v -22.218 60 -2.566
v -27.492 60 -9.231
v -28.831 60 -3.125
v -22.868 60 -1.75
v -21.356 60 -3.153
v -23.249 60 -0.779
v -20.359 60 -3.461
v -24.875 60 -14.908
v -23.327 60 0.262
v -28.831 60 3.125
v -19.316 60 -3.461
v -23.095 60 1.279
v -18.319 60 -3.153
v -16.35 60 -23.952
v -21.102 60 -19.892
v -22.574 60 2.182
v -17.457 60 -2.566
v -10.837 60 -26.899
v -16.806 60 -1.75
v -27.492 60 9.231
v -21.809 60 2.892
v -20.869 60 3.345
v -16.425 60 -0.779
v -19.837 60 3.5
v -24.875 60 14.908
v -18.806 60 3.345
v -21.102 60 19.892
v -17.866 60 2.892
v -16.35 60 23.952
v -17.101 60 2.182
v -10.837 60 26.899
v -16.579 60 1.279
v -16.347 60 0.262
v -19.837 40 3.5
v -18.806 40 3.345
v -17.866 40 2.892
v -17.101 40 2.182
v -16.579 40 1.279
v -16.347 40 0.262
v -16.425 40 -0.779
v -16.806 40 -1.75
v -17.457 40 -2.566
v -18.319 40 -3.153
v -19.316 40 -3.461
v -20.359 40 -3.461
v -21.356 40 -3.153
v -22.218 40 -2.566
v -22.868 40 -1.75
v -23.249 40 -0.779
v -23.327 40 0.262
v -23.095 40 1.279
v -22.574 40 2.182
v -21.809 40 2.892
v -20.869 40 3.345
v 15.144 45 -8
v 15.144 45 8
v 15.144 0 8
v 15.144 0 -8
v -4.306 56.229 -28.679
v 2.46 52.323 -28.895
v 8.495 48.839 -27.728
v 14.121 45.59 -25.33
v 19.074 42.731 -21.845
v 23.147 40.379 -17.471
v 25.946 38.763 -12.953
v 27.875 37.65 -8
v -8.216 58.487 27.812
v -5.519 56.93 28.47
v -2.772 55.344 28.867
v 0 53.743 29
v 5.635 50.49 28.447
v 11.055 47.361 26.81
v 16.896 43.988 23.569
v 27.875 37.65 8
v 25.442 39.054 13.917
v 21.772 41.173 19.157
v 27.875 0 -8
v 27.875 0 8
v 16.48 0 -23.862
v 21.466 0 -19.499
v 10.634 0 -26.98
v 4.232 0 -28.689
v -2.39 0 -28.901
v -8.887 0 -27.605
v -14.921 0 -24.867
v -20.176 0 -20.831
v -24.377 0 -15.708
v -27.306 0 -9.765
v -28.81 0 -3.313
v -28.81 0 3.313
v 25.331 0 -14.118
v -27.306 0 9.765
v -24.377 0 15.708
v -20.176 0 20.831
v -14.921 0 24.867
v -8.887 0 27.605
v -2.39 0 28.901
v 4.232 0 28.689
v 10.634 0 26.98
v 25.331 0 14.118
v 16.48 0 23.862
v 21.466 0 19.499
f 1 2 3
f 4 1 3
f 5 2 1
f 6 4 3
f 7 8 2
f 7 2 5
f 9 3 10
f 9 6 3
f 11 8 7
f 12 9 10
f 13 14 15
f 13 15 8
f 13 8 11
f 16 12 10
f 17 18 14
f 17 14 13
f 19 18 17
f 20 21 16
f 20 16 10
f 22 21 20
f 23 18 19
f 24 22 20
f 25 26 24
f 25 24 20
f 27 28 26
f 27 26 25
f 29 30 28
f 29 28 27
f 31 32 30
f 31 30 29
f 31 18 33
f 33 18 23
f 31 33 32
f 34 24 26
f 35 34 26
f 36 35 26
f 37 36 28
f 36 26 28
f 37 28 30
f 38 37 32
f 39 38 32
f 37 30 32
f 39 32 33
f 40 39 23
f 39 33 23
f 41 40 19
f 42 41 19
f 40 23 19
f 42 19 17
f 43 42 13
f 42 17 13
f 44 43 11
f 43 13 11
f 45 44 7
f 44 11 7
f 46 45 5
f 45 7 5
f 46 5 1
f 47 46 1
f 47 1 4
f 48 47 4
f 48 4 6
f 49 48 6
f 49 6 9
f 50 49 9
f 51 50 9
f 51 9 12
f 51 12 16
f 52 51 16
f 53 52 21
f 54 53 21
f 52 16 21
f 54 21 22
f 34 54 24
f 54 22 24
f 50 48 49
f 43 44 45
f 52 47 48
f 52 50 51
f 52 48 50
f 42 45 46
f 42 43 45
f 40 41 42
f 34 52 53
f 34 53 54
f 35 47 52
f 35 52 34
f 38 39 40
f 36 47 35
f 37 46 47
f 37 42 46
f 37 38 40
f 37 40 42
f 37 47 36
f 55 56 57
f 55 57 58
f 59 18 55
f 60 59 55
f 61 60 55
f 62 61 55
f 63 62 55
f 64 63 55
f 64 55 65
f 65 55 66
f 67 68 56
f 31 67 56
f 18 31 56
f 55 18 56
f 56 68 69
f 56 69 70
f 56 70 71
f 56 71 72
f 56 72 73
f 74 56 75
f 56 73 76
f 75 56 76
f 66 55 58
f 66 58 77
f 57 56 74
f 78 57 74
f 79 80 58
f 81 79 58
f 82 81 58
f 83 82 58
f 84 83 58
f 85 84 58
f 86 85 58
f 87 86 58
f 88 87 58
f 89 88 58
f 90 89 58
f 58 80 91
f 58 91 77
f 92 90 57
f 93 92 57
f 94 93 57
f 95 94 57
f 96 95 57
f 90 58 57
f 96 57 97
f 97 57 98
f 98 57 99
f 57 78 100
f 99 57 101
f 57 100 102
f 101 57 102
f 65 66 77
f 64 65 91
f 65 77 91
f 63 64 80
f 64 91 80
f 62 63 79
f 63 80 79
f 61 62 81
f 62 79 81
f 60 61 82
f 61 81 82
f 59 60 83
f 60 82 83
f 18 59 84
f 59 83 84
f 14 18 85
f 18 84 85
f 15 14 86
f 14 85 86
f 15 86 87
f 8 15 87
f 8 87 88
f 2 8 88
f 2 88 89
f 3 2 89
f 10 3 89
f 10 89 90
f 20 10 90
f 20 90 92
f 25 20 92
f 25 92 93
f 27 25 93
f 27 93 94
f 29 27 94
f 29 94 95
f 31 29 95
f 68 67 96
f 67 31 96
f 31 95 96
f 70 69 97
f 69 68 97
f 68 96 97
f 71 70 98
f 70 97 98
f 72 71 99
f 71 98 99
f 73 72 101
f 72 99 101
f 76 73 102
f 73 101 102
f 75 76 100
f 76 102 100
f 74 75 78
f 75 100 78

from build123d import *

# Parameters (mm, degrees)
SKETCH3_R           = 29
BOSS_EXTRUDE1_DEPTH = 60
CUT_EXTRUDE1_DEPTH  = 30
SKETCH8_R           = 3.5
CUT_EXTRUDE2_DEPTH  = 20
SKETCH15_W          = 16
SKETCH15_H          = 16
CUT_EXTRUDE4_DEPTH  = 61


with BuildPart() as part:
    # Sketch3 → Boss-Extrude1 (new body)
    with BuildSketch(Plane(origin=(0, 0, 0), x_dir=(1, 0, 0), z_dir=(0, 1, 0))):
        with Locations(Location((0, 0, 0), (0, 0, 270))):
            Circle(SKETCH3_R)
    extrude(amount=BOSS_EXTRUDE1_DEPTH)

    # Sketch6 → Cut-Extrude1 (cut, symmetric)
    with BuildSketch(Plane.XY):
        Polygon((-10.837168574, 60), (29, 37), (29, 60), align=None)
    extrude(amount=CUT_EXTRUDE1_DEPTH, both=True, mode=Mode.SUBTRACT)

    # Sketch8 → Cut-Extrude2 (cut)
    with BuildSketch(Plane(origin=(0, 60, 0), x_dir=(1, 0, 0), z_dir=(0, 1, 0))):
        with Locations(Location((-19.837168574, 0, 0), (0, 0, 270))):
            Circle(SKETCH8_R)
    extrude(amount=-CUT_EXTRUDE2_DEPTH, mode=Mode.SUBTRACT)

    # Sketch15 → Cut-Extrude4 (cut, along a direction that is not the sketch's normal)
    with BuildSketch(Plane(origin=(23.27146997, 40.307368355, 0), x_dir=(0.8660254037844416, -0.49999999999999484, 0), z_dir=(0.49999999999999484, 0.8660254037844416, 0))):
        with Locations((-1.38526329, 0)):
            Rectangle(SKETCH15_W, SKETCH15_H)
    extrude(amount=-CUT_EXTRUDE4_DEPTH, dir=(0, 1, 0), mode=Mode.SUBTRACT)


solid = part.part
